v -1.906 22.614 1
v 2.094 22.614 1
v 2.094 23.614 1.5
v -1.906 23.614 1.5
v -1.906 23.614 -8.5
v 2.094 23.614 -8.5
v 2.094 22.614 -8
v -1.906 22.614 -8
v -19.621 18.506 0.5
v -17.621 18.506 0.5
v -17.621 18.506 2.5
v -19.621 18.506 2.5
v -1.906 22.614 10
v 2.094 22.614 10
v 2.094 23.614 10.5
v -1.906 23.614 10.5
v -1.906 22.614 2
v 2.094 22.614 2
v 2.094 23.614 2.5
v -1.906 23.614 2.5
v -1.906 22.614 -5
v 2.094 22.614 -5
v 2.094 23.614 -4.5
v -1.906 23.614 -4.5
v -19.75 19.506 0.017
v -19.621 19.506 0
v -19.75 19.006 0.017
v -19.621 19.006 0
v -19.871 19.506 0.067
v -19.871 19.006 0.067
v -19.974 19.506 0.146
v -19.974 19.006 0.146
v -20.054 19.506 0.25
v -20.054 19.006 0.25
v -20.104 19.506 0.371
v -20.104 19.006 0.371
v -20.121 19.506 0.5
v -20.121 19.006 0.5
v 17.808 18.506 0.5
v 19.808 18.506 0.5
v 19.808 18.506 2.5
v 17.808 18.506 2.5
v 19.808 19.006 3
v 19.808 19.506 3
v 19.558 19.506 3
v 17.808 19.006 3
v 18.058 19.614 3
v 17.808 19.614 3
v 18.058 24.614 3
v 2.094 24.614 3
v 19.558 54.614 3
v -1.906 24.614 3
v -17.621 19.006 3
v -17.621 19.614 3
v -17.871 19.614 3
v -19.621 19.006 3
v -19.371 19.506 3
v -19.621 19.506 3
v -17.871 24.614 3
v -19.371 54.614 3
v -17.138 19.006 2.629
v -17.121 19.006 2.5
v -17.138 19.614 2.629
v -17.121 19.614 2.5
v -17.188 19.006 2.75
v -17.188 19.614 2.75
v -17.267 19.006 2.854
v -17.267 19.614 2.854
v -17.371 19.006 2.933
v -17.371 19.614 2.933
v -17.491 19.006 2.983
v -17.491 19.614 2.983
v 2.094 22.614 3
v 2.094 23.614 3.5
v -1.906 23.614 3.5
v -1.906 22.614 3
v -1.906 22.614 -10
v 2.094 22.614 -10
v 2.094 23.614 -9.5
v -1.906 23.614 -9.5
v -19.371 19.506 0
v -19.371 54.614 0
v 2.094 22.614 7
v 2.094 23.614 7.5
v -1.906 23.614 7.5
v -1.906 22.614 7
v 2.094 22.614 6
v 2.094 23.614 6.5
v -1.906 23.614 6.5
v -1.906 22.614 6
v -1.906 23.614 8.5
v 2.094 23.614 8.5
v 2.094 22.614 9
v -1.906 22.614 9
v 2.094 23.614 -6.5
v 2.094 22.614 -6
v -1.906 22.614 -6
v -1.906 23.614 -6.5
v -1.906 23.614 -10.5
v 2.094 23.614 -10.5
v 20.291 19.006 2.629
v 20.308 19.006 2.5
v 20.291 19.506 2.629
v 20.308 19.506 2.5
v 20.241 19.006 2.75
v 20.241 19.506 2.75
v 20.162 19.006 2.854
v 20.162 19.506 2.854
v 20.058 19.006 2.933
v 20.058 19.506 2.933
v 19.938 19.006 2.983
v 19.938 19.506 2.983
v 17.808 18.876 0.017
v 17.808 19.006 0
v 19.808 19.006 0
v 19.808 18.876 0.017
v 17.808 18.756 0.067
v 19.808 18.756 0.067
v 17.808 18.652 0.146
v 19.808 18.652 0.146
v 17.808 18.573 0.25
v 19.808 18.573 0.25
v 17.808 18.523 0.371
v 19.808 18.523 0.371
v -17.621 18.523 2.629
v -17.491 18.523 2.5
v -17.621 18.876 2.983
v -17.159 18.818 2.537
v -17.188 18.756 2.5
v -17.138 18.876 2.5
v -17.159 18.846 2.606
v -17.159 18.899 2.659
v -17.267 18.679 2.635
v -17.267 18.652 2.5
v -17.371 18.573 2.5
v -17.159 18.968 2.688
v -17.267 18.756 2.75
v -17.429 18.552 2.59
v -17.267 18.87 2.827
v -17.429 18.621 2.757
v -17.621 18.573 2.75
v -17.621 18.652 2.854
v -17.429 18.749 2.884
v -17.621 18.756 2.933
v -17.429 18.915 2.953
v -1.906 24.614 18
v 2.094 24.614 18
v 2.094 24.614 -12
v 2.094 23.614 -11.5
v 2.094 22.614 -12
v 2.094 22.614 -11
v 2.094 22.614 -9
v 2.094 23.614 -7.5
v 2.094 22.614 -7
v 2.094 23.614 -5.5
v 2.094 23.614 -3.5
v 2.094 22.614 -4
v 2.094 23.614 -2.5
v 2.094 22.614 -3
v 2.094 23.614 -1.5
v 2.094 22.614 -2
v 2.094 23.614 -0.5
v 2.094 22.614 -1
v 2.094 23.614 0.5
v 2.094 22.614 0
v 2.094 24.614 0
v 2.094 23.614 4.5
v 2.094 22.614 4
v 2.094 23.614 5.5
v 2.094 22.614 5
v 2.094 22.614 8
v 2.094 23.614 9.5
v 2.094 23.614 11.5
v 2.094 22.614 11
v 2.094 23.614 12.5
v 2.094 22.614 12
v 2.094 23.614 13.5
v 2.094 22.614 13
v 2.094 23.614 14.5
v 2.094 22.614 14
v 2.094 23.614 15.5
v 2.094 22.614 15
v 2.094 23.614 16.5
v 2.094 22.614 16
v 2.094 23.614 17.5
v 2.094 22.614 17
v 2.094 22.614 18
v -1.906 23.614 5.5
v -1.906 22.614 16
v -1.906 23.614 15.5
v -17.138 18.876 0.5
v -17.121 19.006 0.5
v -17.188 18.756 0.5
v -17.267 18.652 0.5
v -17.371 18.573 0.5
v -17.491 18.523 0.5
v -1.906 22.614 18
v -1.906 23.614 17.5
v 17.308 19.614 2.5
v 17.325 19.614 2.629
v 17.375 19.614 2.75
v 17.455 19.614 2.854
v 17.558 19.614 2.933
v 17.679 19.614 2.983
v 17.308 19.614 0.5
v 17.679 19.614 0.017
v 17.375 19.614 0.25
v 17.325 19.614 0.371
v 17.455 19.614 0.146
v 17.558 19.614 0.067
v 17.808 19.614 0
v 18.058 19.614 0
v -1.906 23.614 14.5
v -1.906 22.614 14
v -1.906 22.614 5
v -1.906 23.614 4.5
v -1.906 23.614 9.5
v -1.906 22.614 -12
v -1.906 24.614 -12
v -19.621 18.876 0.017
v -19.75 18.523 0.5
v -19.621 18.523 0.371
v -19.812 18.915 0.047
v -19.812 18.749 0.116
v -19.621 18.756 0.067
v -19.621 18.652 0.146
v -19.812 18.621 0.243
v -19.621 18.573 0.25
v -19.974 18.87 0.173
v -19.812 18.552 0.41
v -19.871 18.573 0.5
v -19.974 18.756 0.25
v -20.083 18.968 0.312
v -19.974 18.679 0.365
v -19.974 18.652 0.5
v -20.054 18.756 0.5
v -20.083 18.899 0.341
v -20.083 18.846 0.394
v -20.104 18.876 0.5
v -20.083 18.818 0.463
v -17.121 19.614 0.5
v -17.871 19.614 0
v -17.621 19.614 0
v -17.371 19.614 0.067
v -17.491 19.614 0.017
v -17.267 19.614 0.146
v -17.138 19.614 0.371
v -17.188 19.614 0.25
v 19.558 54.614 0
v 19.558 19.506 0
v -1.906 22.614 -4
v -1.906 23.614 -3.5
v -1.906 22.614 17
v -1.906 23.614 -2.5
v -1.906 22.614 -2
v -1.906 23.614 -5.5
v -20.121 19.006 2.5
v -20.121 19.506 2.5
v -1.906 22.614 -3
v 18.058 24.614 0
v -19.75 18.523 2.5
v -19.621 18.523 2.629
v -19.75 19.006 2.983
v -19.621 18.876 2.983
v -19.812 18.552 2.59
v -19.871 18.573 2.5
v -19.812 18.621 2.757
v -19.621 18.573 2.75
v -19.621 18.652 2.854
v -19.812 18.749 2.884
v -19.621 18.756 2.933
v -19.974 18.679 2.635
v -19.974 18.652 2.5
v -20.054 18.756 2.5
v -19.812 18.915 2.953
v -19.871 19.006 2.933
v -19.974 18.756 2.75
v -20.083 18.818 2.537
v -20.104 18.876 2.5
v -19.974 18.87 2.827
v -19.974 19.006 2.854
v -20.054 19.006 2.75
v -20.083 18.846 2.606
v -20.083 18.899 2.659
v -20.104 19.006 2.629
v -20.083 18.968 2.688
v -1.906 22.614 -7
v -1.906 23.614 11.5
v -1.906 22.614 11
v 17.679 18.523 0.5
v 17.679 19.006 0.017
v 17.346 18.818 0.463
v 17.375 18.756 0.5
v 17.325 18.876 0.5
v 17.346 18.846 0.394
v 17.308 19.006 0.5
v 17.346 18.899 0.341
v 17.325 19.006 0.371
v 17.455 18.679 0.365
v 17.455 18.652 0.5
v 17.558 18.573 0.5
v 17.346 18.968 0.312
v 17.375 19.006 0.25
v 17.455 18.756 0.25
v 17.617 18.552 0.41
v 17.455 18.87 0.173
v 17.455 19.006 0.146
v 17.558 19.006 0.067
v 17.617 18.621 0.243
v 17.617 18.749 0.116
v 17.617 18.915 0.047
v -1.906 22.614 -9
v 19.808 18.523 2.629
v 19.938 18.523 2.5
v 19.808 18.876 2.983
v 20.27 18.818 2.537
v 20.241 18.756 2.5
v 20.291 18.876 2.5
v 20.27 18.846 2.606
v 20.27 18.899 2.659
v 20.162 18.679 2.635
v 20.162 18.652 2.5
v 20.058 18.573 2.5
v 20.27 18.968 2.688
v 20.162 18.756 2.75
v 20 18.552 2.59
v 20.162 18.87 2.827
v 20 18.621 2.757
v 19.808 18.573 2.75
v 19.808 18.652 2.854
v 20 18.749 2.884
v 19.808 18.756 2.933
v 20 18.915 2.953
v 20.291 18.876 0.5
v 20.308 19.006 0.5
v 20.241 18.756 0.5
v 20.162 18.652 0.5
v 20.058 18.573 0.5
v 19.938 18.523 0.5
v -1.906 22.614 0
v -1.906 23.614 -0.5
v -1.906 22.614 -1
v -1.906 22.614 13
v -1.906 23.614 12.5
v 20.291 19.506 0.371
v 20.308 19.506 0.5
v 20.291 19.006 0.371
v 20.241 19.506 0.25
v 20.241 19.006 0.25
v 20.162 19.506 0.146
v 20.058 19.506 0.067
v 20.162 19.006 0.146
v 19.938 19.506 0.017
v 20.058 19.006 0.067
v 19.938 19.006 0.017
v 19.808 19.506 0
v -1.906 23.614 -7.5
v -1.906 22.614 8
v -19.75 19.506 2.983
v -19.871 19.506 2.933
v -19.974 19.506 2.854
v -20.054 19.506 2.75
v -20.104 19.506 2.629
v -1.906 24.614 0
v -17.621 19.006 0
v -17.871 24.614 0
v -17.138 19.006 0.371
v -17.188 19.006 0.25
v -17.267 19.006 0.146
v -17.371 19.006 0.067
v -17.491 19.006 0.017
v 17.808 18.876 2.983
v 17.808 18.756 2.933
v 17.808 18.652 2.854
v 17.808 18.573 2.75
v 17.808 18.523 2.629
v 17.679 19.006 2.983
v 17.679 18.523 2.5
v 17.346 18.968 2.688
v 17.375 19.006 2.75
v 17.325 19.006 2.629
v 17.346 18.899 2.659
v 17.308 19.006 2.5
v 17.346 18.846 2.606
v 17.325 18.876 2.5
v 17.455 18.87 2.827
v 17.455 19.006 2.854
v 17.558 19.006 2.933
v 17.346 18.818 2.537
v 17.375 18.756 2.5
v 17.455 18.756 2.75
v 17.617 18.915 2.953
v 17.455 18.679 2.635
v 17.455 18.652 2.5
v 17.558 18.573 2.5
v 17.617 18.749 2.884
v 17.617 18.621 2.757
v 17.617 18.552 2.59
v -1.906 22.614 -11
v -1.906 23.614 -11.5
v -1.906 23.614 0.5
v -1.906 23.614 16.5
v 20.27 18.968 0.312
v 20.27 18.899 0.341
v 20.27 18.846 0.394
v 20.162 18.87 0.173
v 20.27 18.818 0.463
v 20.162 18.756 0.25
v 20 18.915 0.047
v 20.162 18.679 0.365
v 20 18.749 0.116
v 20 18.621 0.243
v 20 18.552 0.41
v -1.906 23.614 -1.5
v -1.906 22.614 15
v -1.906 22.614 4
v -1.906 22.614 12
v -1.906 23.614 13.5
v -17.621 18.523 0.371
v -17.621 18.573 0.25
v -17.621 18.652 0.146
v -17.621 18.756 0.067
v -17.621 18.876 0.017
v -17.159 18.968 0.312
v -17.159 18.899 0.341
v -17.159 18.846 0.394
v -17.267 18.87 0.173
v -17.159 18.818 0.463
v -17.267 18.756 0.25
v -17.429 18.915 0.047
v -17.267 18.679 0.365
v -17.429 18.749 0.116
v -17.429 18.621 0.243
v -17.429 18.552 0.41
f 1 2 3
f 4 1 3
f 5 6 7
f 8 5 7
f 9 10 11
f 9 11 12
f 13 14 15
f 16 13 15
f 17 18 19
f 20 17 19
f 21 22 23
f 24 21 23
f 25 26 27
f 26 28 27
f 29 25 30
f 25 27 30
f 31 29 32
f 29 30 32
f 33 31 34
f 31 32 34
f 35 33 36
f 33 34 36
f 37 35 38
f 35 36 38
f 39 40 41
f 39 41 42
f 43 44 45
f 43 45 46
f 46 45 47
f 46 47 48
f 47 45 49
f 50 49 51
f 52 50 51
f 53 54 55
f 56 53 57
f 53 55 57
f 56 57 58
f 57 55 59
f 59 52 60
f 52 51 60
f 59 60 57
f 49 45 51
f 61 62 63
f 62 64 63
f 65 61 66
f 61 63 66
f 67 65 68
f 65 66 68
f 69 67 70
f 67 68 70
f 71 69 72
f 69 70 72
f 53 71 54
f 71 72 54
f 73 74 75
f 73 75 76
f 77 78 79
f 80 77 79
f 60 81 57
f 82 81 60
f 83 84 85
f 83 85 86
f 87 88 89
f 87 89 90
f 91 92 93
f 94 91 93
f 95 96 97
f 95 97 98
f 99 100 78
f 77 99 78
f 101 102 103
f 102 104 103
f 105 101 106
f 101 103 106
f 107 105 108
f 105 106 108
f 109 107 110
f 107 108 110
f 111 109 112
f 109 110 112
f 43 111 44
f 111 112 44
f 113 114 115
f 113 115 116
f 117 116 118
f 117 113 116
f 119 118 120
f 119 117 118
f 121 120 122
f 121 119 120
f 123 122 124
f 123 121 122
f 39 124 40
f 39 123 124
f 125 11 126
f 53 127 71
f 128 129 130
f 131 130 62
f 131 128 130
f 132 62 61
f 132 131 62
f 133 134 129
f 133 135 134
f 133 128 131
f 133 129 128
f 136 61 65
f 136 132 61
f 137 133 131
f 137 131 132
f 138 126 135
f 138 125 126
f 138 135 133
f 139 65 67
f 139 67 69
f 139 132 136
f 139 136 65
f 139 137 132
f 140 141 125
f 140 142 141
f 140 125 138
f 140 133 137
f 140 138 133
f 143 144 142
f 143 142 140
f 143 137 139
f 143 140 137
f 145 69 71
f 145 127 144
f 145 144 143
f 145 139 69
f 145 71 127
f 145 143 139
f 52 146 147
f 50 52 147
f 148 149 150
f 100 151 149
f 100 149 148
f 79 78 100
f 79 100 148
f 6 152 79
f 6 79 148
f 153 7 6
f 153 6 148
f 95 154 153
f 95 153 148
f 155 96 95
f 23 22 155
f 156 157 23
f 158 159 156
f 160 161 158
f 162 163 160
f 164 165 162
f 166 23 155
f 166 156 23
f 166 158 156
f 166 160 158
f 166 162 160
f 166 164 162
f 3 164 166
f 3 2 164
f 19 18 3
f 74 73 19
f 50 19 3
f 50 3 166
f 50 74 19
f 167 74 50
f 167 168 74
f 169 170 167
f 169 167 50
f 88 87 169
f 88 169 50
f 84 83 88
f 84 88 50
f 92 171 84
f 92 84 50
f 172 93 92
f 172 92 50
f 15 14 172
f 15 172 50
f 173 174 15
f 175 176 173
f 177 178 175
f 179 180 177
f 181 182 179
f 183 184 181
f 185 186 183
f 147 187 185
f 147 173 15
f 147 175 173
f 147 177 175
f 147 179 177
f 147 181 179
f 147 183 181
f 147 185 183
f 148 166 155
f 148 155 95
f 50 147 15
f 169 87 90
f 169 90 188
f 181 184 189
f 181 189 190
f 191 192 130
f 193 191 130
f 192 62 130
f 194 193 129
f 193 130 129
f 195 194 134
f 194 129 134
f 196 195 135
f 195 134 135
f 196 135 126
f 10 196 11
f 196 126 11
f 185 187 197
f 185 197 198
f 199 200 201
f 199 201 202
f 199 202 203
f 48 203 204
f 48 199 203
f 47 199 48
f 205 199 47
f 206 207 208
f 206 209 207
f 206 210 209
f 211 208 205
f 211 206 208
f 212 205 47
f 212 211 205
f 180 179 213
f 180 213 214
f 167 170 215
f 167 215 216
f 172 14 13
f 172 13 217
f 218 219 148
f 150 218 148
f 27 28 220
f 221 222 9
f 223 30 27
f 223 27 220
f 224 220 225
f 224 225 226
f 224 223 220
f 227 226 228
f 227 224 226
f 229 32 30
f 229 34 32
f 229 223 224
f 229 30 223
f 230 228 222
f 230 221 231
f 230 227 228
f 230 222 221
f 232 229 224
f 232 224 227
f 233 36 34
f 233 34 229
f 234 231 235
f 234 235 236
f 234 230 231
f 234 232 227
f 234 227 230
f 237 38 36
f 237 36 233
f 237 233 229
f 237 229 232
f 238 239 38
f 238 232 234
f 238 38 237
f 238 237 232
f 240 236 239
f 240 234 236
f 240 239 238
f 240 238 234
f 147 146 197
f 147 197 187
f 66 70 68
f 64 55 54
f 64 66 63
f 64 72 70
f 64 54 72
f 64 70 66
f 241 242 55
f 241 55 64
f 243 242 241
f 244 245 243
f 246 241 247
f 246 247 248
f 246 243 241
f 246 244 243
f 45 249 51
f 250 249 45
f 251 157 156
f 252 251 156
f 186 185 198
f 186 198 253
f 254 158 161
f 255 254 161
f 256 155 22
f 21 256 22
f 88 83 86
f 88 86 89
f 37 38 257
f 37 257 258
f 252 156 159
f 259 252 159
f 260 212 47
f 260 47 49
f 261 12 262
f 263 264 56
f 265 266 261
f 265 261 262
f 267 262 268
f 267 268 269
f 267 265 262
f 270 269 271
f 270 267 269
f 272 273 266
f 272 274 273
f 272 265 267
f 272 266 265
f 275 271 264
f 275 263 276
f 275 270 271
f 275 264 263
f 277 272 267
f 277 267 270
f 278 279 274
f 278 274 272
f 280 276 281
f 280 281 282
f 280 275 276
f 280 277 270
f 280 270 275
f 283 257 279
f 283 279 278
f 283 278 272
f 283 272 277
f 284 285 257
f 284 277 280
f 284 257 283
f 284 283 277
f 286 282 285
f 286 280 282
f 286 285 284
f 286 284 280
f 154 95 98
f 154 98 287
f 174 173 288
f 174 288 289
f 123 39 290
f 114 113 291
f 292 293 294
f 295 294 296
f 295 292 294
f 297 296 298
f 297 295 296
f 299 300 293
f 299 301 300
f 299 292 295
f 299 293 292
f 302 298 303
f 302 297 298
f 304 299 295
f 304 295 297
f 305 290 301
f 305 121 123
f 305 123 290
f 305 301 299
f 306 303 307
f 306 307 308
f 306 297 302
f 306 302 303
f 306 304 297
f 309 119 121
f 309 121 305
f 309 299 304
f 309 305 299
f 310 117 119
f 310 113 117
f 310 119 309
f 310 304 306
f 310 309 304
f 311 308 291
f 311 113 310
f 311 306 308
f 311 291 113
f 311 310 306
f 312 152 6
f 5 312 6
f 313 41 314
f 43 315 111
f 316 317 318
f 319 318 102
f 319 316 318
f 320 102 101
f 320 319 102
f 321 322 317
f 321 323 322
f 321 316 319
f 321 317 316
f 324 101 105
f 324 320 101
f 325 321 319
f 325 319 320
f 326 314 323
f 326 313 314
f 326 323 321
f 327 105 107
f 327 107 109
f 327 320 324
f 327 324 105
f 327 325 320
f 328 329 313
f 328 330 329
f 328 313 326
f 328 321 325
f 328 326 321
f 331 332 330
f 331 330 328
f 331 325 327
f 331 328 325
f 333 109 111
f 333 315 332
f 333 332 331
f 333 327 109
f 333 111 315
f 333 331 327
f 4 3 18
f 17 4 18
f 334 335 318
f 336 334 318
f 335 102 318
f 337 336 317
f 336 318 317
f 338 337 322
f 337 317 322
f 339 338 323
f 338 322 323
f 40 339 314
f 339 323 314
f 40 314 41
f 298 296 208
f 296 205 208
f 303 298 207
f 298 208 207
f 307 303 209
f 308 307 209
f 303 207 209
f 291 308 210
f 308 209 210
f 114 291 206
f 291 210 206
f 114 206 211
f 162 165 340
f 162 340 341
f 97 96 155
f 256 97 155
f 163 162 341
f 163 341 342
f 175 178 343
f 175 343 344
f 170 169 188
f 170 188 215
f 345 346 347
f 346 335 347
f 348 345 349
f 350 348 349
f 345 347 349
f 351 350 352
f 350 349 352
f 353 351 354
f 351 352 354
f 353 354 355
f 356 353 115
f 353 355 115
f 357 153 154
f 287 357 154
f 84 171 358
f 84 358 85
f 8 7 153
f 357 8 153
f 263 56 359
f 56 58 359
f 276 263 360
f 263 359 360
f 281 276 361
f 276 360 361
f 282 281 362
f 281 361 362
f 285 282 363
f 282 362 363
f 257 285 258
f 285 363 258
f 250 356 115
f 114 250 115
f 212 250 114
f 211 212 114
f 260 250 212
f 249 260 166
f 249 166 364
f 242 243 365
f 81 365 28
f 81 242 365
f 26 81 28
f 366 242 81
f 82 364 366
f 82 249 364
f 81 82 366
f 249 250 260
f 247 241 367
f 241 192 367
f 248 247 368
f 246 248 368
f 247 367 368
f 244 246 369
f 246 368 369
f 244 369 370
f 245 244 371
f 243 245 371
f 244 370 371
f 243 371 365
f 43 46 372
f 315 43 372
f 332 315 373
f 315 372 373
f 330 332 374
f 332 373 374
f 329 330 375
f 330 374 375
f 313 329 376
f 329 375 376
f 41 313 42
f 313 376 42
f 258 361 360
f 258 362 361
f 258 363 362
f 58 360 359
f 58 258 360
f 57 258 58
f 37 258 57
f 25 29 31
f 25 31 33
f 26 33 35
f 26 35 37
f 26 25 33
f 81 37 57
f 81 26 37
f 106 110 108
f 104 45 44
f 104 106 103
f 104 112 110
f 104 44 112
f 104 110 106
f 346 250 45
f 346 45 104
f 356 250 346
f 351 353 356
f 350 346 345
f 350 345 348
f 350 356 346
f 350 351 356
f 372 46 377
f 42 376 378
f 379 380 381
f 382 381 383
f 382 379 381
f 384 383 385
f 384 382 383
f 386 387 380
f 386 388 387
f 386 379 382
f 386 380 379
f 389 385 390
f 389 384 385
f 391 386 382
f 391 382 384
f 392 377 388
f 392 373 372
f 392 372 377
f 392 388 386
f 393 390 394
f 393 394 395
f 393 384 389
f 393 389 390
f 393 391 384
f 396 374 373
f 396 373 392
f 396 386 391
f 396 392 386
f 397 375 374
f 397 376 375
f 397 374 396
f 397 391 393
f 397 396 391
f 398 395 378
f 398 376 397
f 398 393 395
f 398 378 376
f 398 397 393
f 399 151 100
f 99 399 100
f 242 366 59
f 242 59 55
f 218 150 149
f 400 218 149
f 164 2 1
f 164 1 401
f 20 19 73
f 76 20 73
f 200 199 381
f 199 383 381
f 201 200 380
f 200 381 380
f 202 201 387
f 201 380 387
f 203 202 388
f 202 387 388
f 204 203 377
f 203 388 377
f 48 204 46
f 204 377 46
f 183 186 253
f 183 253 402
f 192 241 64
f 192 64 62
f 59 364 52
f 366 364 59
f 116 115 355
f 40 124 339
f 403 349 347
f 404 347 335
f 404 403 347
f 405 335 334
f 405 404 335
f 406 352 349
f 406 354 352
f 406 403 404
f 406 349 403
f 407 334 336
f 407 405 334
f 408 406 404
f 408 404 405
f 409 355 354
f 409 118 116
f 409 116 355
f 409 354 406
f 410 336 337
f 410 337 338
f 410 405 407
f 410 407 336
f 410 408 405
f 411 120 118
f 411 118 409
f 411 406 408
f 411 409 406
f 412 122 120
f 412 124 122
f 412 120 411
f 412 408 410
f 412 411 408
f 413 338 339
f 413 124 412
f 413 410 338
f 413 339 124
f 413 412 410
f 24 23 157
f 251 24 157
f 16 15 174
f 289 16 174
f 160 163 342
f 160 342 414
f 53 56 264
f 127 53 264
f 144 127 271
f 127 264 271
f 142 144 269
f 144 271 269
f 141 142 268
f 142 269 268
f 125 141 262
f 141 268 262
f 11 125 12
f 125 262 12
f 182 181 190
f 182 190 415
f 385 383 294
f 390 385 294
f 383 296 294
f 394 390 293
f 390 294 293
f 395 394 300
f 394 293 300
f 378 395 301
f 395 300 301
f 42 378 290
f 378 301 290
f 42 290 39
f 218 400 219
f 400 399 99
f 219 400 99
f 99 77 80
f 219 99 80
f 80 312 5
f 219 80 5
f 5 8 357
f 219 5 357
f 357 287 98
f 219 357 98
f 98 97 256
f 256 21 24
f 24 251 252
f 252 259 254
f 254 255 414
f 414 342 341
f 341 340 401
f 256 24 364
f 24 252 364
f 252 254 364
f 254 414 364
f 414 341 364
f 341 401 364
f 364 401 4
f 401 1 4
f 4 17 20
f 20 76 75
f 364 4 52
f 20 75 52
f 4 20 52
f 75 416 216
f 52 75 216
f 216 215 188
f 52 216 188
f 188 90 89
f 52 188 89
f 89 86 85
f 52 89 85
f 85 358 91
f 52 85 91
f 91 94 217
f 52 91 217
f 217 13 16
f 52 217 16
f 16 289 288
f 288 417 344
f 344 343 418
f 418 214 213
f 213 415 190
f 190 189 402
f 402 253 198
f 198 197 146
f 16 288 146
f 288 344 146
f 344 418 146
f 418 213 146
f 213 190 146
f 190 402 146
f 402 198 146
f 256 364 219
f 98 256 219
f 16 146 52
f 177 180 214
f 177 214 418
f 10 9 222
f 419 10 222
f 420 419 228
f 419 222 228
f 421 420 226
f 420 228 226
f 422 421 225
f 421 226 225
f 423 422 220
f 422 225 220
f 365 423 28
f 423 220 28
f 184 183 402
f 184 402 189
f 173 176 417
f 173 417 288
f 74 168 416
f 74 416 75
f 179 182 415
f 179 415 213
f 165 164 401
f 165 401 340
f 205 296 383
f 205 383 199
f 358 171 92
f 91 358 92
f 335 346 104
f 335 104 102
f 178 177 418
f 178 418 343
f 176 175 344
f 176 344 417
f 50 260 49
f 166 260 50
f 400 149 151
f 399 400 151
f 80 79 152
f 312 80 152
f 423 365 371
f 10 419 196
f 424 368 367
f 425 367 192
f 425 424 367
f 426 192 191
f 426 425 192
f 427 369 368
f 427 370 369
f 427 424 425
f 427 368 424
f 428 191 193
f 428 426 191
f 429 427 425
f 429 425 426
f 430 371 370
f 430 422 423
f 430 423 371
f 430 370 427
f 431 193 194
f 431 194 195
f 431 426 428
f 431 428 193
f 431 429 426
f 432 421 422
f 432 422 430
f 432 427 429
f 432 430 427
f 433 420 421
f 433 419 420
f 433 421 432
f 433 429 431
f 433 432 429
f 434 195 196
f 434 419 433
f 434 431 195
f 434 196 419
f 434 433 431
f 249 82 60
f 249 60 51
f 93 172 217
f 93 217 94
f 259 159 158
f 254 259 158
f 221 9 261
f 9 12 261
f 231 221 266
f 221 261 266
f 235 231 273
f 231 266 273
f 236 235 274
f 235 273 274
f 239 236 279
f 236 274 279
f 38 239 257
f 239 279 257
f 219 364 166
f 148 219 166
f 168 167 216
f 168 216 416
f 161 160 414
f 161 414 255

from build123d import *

# Parameters (mm, degrees)
Y_KSEKLIK_EKSTR_ZYON1_DEPTH = 3
IZIM2_W                     = 4
IZIM2_H                     = 2
Y_KSEKLIK_EKSTR_ZYON2_DEPTH = 15
KES_EKSTR_ZYON1_DEPTH       = 15
KES_EKSTR_ZYON2_DEPTH       = 10
RADYUS5_R                   = 0.5
RADYUS6_R                   = 0.5
RADYUS7_R                   = 0.5
RADYUS8_R                   = 0.5


with BuildPart() as part:
    # Çizim1 → Yükseklik-Ekstrüzyon1 (new body)
    with BuildSketch(Plane.XY):
        Polygon((-19.370820864, 54.614030312), (19.558307899, 54.614030312), (19.558307899, 19.505544156), (20.308307899, 19.505544156), (20.308307899, 18.505544156), (17.308307899, 18.505544156), (17.308307899, 19.614030312), (18.058307899, 19.614030312), (18.058307899, 24.614030312), (-17.870820864, 24.614030312), (-17.870820864, 19.614030312), (-17.120820864, 19.614030312), (-17.120820864, 18.505544156), (-20.120820864, 18.505544156), (-20.120820864, 19.505544156), (-19.370820864, 19.505544156), align=None)
    extrude(amount=Y_KSEKLIK_EKSTR_ZYON1_DEPTH)

    # Çizim2 → Yükseklik-Ekstrüzyon2 (add, symmetric)
    with BuildSketch(Plane.XY.offset(3)):
        with Locations((0.094179136, 23.614030312)):
            Rectangle(IZIM2_W, IZIM2_H)
    extrude(amount=Y_KSEKLIK_EKSTR_ZYON2_DEPTH, both=True)

    # Çizim3 → Kes-Ekstrüzyon1 (cut)
    with BuildSketch(Plane(origin=(2.094179136, 0, 0), x_dir=(0, 0, -1), z_dir=(1, 0, 0))):
        Polygon((-3, 22.614030312), (-2, 22.614030312), (-2.5, 23.614030312), align=None)
        Polygon((-2, 22.614030312), (-1, 22.614030312), (-1.5, 23.614030312), align=None)
        Polygon((2, 22.614030312), (3, 22.614030312), (2.5, 23.614030312), align=None)
        Polygon((3, 22.614030312), (4, 22.614030312), (3.5, 23.614030312), align=None)
        Polygon((4, 22.614030312), (5, 22.614030312), (4.5, 23.614030312), align=None)
        Polygon((5, 22.614030312), (6, 22.614030312), (5.5, 23.614030312), align=None)
        Polygon((7, 22.614030312), (8, 22.614030312), (7.5, 23.614030312), align=None)
        Polygon((8, 22.614030312), (9, 22.614030312), (8.5, 23.614030312), align=None)
        Polygon((9, 22.614030312), (10, 22.614030312), (9.5, 23.614030312), align=None)
        Polygon((11, 22.614030312), (10.5, 23.614030312), (10, 22.614030312), align=None)
        Polygon((11.5, 23.614030312), (11, 22.614030312), (12, 22.614030312), align=None)
        Polygon((-0.5, 23.614030312), (0, 22.614030312), (-1, 22.614030312), align=None)
        Polygon((0.5, 23.614030312), (1, 22.614030312), (0, 22.614030312), align=None)
        Polygon((1.5, 23.614030312), (2, 22.614030312), (1, 22.614030312), align=None)
        Polygon((6.5, 23.614030312), (7, 22.614030312), (6, 22.614030312), align=None)
    extrude(amount=-KES_EKSTR_ZYON1_DEPTH, mode=Mode.SUBTRACT)

    # Çizim4 → Kes-Ekstrüzyon2 (cut)
    with BuildSketch(Plane(origin=(2.094179136, 0, 0), x_dir=(0, 0, -1), z_dir=(1, 0, 0))):
        Polygon((-11, 22.614030312), (-10, 22.614030312), (-10.5, 23.614030312), align=None)
        Polygon((-9, 22.614030312), (-8, 22.614030312), (-8.5, 23.614030312), align=None)
        Polygon((-17, 22.614030312), (-18, 22.614030312), (-17.5, 23.614030312), align=None)
        Polygon((-16, 22.614030312), (-17, 22.614030312), (-16.5, 23.614030312), align=None)
        Polygon((-15, 22.614030312), (-16, 22.614030312), (-15.5, 23.614030312), align=None)
        Polygon((-14, 22.614030312), (-15, 22.614030312), (-14.5, 23.614030312), align=None)
        Polygon((-13, 22.614030312), (-14, 22.614030312), (-13.5, 23.614030312), align=None)
        Polygon((-12, 22.614030312), (-13, 22.614030312), (-12.5, 23.614030312), align=None)
        Polygon((-11.5, 23.614030312), (-11, 22.614030312), (-12, 22.614030312), align=None)
        Polygon((-9, 22.614030312), (-10, 22.614030312), (-9.5, 23.614030312), align=None)
        Polygon((-7, 22.614030312), (-8, 22.614030312), (-7.5, 23.614030312), align=None)
        Polygon((-6, 22.614030312), (-7, 22.614030312), (-6.5, 23.614030312), align=None)
        Polygon((-5, 22.614030312), (-6, 22.614030312), (-5.5, 23.614030312), align=None)
        Polygon((-4, 22.614030312), (-5, 22.614030312), (-4.5, 23.614030312), align=None)
        Polygon((-3, 22.614030312), (-4, 22.614030312), (-3.5, 23.614030312), align=None)
        Polygon((-2, 22.614030312), (-3, 22.614030312), (-2.5, 23.614030312), align=None)
        Polygon((-2, 22.614030312), (-1.5, 23.614030312), (-1, 22.614030312), align=None)
        Polygon((0, 22.614030312), (-1, 22.614030312), (-0.5, 23.614030312), align=None)
        Polygon((1, 22.614030312), (0, 22.614030312), (0.5, 23.614030312), align=None)
    extrude(amount=-KES_EKSTR_ZYON2_DEPTH, mode=Mode.SUBTRACT)

    # Radyus5
    radyus5_edges = [part.edges().sort_by_distance(p)[0] for p in [
        (18.808307899, 18.505544156, 0),
        (18.808307899, 18.505544156, 3),
    ]]
    fillet(radyus5_edges, radius=RADYUS5_R)

    # Radyus6
    radyus6_edges = [part.edges().sort_by_distance(p)[0] for p in [
        (-18.620820864, 18.505544156, 3),
        (-18.620820864, 18.505544156, 0),
    ]]
    fillet(radyus6_edges, radius=RADYUS6_R)

    # Radyus7
    radyus7_edges = [part.edges().sort_by_distance(p)[0] for p in [
        (-20.120820864, 19.255544156, 3),
        (-20.120820864, 19.255544156, 0),
        (-17.120820864, 18.505544156, 1.5),
        (-20.120820864, 18.505544156, 1.5),
        (-17.120820864, 19.309787234, 0),
        (-17.120820864, 19.309787234, 3),
        (-17.120820864, 18.651990766, 2.853553391),
        (-17.120820864, 18.651990766, 0.146446609),
        (-20.120820864, 18.651990766, 2.853553391),
        (-20.120820864, 18.651990766, 0.146446609),
    ]]
    fillet(radyus7_edges, radius=RADYUS7_R)

    # Radyus8
    radyus8_edges = [part.edges().sort_by_distance(p)[0] for p in [
        (17.308307899, 19.309787234, 0),
        (17.308307899, 19.309787234, 3),
        (20.308307899, 18.505544156, 1.5),
        (17.308307899, 18.505544156, 1.5),
        (20.308307899, 19.255544156, 0),
        (20.308307899, 19.255544156, 3),
        (20.308307899, 18.651990766, 2.853553391),
        (20.308307899, 18.651990766, 0.146446609),
        (17.308307899, 18.651990766, 2.853553391),
        (17.308307899, 18.651990766, 0.146446609),
    ]]
    fillet(radyus8_edges, radius=RADYUS8_R)


solid = part.part
